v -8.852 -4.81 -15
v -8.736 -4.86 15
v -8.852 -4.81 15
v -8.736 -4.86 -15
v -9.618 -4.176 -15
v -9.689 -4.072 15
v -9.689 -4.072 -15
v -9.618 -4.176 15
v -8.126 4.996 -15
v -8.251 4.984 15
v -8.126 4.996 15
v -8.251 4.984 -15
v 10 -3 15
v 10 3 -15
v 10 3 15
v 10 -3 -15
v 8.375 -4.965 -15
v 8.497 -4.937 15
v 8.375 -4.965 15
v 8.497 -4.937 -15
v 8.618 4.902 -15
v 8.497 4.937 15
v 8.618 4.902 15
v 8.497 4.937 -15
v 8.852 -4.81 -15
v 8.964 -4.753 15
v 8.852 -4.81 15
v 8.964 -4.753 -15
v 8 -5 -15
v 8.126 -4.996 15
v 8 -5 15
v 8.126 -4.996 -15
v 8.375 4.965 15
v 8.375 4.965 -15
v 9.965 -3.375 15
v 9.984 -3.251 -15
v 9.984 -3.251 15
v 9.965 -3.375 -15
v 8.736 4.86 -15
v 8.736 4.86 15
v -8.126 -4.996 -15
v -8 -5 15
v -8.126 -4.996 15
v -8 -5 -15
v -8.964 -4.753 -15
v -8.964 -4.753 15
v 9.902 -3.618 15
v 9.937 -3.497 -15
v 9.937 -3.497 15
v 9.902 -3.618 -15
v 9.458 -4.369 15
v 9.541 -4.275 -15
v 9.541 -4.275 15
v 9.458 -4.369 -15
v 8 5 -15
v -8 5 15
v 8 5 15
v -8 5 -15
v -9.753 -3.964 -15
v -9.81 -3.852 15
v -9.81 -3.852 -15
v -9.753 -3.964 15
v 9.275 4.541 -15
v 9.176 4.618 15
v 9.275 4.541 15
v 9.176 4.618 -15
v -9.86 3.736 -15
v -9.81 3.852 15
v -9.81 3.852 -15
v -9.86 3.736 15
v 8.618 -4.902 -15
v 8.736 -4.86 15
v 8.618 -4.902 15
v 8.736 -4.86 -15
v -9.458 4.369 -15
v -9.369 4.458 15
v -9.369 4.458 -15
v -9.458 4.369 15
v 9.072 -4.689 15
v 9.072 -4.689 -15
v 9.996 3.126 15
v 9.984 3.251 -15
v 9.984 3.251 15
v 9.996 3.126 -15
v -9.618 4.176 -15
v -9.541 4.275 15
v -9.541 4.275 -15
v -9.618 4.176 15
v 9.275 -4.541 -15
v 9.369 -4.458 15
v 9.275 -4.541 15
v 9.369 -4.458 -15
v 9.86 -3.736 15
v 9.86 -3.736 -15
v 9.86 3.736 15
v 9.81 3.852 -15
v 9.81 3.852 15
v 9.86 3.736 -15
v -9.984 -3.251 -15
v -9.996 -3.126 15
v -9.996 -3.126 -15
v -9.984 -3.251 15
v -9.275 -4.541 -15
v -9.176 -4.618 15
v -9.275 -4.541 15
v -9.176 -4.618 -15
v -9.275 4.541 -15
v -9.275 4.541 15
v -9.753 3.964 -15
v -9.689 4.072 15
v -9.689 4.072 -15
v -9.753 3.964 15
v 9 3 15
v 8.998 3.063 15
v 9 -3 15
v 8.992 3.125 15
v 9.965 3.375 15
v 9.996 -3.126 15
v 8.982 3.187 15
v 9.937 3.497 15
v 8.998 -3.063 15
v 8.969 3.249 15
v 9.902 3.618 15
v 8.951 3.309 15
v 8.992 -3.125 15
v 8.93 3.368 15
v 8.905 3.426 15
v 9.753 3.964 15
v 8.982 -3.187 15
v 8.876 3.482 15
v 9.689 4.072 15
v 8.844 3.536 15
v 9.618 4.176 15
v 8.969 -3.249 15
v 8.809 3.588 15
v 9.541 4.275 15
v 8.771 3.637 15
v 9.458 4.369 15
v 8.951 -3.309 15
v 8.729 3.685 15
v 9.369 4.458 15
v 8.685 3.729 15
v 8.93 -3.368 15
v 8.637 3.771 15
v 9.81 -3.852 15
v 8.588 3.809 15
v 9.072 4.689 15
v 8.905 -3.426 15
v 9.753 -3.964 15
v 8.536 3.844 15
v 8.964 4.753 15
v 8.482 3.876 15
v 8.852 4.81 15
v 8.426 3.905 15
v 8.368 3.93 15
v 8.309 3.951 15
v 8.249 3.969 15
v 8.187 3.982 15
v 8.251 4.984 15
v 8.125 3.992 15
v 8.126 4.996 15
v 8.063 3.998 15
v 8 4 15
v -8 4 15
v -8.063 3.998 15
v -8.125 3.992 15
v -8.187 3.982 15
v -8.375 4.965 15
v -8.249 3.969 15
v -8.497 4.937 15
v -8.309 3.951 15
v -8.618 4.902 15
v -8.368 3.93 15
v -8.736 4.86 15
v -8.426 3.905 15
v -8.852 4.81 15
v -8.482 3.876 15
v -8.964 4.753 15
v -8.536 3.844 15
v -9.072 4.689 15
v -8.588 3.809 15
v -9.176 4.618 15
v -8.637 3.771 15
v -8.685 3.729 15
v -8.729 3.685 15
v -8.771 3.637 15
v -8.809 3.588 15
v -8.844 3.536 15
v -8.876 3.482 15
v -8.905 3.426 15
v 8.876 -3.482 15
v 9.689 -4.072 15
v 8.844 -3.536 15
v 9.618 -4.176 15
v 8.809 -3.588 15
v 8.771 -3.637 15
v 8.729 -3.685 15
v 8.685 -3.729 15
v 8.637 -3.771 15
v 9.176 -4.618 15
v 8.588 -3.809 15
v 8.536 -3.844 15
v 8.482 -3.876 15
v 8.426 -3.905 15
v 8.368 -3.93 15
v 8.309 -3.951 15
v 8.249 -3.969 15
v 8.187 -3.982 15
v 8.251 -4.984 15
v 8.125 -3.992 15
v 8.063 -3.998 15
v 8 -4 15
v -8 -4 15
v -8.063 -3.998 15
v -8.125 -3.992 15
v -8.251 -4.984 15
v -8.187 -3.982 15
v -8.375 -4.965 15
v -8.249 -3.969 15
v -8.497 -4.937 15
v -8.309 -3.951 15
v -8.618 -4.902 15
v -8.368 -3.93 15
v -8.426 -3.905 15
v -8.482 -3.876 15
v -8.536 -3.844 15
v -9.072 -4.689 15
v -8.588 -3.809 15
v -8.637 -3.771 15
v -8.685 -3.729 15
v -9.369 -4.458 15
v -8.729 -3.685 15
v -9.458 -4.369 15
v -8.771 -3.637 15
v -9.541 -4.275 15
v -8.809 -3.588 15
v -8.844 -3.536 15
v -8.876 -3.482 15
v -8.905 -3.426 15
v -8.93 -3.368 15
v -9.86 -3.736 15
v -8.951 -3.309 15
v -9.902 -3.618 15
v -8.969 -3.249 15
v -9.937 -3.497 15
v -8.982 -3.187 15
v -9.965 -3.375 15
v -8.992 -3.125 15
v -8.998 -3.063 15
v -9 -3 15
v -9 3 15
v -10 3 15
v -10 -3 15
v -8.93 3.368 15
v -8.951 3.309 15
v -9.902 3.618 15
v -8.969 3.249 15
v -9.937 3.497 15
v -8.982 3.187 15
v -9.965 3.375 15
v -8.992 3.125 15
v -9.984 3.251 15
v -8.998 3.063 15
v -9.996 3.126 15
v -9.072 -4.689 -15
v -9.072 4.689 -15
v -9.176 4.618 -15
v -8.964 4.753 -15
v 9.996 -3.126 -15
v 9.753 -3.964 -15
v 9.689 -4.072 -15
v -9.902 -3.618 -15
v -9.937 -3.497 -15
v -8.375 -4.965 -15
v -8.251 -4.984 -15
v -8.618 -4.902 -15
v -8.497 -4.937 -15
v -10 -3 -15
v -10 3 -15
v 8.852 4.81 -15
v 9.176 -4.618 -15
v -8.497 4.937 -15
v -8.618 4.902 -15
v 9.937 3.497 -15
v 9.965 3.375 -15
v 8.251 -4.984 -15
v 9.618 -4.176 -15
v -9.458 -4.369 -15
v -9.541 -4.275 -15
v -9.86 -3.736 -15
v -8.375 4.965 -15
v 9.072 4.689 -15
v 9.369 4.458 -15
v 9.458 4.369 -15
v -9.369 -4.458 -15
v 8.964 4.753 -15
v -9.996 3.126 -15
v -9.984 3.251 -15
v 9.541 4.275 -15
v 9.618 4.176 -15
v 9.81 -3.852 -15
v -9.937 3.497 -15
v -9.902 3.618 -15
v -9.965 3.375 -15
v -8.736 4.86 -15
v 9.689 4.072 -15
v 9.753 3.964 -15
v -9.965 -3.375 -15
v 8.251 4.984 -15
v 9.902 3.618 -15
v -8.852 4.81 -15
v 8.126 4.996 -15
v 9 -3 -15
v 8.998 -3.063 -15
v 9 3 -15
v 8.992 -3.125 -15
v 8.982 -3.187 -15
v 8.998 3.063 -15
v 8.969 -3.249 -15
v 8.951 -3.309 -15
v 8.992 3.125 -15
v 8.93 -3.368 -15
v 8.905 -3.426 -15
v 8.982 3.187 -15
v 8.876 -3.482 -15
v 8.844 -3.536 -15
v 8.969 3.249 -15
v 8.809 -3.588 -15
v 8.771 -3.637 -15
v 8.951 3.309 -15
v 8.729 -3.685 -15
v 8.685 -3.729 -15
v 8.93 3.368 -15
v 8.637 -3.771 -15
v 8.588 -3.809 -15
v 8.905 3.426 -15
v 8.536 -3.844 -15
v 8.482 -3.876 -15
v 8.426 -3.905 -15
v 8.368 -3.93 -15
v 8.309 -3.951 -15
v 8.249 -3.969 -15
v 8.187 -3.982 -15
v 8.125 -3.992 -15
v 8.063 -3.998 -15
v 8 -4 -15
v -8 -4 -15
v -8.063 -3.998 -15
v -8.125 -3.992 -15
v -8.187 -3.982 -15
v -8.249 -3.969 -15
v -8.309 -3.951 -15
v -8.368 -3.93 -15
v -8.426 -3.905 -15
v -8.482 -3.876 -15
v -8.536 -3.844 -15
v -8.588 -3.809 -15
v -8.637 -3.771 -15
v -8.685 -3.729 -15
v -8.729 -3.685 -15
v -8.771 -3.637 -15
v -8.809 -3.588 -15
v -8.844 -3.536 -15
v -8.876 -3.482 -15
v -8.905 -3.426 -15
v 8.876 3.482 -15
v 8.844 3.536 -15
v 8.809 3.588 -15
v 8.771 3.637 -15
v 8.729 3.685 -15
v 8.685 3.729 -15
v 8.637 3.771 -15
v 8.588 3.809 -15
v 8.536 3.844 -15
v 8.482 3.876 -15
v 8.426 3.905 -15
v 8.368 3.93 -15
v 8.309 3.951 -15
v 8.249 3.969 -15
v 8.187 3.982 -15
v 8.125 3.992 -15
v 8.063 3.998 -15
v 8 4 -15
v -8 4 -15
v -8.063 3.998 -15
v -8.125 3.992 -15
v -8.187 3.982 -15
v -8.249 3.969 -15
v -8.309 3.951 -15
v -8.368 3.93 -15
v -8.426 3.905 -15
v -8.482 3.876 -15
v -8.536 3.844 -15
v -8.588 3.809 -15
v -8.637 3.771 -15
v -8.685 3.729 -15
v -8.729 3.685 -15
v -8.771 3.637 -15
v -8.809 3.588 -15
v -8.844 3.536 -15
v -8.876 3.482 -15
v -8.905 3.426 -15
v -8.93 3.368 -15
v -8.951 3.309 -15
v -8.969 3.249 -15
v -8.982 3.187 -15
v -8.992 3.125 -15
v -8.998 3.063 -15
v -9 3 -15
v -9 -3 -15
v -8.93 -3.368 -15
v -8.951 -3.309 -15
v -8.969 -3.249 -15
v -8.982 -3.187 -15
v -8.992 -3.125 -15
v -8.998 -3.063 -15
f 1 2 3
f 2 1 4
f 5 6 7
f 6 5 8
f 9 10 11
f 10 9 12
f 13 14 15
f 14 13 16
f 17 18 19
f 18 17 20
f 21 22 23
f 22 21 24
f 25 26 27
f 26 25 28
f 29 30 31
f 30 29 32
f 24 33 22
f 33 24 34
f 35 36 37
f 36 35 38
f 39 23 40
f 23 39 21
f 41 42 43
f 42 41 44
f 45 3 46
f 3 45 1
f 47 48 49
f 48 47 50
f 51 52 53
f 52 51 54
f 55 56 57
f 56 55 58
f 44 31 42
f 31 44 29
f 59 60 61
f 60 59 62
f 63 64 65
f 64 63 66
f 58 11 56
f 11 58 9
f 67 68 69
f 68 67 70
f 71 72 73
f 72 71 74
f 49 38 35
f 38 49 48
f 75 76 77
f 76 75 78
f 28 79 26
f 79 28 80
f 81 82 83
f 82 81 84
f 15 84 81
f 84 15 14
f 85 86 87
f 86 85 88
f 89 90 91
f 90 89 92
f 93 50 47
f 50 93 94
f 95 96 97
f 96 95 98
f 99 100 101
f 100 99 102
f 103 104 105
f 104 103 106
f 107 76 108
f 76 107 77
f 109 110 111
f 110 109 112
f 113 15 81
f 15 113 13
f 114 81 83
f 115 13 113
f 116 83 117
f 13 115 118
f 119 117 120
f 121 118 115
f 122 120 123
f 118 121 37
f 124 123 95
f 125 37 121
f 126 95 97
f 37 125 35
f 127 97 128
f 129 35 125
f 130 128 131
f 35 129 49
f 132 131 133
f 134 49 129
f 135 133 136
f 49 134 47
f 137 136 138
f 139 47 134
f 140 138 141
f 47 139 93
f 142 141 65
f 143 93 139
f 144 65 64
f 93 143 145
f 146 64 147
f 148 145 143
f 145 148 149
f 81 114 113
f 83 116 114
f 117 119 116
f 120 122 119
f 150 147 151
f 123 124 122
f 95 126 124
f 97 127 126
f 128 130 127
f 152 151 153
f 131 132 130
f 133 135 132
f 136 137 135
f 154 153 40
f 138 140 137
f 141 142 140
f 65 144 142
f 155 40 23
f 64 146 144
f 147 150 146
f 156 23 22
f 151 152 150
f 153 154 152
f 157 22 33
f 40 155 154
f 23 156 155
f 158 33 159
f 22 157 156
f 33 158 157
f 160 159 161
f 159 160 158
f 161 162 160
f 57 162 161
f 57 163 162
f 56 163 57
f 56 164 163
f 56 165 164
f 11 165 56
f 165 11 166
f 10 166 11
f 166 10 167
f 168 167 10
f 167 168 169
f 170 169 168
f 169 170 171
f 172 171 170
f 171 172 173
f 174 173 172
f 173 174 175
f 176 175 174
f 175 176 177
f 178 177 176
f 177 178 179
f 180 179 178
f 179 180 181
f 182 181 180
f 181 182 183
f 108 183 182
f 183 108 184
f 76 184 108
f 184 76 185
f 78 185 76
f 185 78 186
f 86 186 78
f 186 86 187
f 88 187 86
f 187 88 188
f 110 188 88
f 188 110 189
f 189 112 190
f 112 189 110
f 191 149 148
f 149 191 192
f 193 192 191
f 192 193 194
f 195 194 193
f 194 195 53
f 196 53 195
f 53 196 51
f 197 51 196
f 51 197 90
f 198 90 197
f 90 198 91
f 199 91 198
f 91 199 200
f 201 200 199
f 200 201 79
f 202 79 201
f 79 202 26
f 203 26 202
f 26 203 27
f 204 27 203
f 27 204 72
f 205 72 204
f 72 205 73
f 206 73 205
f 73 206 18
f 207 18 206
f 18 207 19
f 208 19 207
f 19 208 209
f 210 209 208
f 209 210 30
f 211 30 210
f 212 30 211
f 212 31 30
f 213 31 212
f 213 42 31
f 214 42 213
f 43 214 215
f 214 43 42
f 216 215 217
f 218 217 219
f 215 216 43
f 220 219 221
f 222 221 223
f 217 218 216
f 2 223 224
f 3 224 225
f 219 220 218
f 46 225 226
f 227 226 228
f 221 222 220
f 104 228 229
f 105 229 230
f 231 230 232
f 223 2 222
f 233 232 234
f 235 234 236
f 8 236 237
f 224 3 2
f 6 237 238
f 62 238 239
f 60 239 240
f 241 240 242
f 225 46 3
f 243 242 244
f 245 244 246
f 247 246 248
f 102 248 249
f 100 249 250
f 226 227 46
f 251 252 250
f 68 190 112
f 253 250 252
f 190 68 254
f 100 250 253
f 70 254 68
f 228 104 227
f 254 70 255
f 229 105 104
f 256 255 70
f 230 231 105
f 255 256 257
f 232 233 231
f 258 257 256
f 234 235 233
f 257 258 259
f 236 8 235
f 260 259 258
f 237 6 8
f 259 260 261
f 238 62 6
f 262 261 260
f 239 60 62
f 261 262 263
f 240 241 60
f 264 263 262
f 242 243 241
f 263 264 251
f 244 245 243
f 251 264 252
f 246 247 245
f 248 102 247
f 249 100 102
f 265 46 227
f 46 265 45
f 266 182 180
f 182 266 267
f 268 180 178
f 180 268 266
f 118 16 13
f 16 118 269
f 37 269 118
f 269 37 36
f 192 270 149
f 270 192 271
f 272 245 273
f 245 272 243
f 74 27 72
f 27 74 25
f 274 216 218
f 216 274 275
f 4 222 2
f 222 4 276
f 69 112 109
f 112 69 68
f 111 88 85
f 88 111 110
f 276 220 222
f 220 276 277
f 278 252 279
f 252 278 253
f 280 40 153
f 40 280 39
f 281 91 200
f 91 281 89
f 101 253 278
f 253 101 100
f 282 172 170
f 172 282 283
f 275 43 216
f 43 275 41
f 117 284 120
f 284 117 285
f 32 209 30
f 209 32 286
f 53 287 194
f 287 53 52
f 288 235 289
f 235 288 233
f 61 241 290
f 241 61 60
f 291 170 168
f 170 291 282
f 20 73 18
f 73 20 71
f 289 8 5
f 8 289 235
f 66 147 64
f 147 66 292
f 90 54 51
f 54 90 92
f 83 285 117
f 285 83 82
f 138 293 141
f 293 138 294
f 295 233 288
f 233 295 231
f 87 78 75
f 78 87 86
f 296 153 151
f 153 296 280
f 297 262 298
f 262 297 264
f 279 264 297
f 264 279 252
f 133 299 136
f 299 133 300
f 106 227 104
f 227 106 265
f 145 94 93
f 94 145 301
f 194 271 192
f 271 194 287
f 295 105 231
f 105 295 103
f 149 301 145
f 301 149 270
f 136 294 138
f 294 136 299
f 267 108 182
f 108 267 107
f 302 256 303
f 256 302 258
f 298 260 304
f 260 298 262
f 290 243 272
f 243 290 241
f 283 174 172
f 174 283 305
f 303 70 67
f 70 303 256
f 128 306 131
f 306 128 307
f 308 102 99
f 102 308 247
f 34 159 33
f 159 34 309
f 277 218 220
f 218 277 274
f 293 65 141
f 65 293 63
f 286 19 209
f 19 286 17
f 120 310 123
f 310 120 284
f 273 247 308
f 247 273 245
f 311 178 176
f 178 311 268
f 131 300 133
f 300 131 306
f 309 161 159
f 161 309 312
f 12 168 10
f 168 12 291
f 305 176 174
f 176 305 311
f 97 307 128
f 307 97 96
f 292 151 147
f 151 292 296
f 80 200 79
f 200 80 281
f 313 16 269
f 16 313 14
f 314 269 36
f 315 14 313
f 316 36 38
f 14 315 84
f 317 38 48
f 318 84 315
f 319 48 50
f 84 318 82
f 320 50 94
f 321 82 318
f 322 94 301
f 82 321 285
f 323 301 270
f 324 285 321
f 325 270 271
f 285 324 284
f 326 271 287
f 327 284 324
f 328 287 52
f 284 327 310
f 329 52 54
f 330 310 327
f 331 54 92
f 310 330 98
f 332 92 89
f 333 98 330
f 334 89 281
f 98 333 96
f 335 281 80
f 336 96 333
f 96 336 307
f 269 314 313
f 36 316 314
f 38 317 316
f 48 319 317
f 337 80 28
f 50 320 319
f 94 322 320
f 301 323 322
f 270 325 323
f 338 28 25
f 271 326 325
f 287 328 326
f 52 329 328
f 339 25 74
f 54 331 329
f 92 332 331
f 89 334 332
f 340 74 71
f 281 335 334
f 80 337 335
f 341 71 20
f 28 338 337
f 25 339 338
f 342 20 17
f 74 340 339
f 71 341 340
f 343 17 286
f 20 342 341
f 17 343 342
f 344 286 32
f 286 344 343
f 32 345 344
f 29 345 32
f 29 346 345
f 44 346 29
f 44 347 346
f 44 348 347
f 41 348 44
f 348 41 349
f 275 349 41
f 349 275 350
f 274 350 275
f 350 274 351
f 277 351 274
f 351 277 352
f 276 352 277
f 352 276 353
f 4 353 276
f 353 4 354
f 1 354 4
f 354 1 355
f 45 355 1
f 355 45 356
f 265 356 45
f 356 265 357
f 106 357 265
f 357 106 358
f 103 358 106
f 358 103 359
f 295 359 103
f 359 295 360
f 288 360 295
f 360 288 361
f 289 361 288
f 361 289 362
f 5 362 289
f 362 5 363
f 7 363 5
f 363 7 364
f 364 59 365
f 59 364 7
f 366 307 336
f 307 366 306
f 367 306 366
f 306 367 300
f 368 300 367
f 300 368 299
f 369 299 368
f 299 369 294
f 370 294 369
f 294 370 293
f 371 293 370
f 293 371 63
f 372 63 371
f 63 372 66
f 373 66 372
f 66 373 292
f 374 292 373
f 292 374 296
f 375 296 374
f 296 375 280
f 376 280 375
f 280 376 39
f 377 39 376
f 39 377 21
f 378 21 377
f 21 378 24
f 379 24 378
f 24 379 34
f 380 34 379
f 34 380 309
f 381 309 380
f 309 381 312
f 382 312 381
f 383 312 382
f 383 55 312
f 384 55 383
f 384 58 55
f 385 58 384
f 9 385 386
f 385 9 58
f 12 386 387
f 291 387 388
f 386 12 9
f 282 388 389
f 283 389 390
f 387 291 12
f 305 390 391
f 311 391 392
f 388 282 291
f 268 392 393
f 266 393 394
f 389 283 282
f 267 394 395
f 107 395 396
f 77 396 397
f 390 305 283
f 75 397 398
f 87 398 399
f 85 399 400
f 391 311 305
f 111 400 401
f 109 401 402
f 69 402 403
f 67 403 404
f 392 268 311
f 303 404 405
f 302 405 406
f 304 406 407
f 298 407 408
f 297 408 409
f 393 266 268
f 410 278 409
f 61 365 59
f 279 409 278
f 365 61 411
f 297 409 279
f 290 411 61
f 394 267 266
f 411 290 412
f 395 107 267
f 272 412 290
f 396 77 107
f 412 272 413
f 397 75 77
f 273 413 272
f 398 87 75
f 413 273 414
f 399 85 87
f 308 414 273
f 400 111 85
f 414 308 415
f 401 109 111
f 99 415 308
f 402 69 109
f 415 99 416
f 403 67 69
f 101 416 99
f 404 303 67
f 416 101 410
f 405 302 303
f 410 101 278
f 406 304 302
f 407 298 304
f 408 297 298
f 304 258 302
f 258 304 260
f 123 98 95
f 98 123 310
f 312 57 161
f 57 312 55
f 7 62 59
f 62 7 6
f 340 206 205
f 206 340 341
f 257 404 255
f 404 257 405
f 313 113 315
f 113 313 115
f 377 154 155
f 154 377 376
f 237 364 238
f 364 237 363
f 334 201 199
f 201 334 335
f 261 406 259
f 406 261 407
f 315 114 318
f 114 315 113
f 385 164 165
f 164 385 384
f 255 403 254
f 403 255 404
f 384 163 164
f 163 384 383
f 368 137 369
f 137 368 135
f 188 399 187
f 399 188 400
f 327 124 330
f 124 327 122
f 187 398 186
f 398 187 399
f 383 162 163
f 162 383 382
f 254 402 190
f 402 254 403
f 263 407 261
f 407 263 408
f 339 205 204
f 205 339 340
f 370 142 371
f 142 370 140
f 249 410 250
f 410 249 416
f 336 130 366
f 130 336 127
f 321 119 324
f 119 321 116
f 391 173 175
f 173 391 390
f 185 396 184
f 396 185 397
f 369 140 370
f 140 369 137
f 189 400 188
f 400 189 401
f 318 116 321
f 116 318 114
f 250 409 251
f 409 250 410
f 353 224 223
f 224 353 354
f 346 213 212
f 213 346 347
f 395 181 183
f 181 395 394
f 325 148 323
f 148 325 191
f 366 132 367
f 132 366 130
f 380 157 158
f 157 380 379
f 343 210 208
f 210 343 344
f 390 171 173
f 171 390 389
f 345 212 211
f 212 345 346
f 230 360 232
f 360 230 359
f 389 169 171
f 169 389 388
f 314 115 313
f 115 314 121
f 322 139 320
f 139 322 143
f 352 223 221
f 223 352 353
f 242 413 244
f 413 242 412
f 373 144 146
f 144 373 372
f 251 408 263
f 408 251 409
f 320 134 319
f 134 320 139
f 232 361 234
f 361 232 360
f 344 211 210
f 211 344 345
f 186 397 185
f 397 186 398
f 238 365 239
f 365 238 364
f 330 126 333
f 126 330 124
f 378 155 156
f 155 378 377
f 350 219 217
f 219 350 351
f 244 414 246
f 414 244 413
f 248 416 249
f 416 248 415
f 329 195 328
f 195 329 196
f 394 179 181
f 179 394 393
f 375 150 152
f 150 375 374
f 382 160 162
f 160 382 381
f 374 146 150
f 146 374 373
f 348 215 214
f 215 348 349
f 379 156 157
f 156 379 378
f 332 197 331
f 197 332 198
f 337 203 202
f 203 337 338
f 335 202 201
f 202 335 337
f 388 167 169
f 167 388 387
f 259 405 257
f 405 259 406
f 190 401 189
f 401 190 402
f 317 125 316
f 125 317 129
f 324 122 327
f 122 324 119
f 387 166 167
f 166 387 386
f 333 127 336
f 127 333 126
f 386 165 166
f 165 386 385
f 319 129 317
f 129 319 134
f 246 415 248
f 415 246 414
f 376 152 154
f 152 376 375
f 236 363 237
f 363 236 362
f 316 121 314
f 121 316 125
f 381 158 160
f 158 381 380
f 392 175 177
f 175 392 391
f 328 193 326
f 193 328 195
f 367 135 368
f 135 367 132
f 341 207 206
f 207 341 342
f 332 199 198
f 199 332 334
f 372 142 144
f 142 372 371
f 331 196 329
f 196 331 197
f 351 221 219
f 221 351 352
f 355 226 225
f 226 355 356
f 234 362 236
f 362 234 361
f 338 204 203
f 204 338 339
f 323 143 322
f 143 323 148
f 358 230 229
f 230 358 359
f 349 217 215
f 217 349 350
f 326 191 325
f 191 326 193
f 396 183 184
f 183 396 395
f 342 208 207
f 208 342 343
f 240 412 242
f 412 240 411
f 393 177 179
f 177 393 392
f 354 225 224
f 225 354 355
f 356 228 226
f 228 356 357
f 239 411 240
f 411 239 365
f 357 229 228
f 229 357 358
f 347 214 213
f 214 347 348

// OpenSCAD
// variables
length = 20; // [10:400]
width = 10; // [10:400]
height = 30; // [1:400]
radius = 2; // [2:31]
wallthickness = 1; // [1:30]
// model
difference(){
	hull(){
		translate([(length-2*radius)/2,(width-2*radius)/2,0]) cylinder(h=height,d=2*radius,center=true,$fn=100);
		translate([-(length-2*radius)/2,(width-2*radius)/2,0]) cylinder(h=height,d=2*radius,center=true,$fn=100);
		translate([(length-2*radius)/2,-(width-2*radius)/2,0]) cylinder(h=height,d=2*radius,center=true,$fn=100);
		translate([-(length-2*radius)/2,-(width-2*radius)/2,0]) cylinder(h=height,d=2*radius,center=true,$fn=100);
	}
	hull(){
		translate([(length-2*radius)/2,(width-2*radius)/2,0]) cylinder(h=height,d=2*(radius-wallthickness),center=true,$fn=100);
		translate([-(length-2*radius)/2,(width-2*radius)/2,0]) cylinder(h=height,d=2*(radius-wallthickness),center=true,$fn=100);
		translate([(length-2*radius)/2,-(width-2*radius)/2,0]) cylinder(h=height,d=2*(radius-wallthickness),center=true,$fn=100);
		translate([-(length-2*radius)/2,-(width-2*radius)/2,0]) cylinder(h=height,d=2*(radius-wallthickness),center=true,$fn=100);
	}
}
